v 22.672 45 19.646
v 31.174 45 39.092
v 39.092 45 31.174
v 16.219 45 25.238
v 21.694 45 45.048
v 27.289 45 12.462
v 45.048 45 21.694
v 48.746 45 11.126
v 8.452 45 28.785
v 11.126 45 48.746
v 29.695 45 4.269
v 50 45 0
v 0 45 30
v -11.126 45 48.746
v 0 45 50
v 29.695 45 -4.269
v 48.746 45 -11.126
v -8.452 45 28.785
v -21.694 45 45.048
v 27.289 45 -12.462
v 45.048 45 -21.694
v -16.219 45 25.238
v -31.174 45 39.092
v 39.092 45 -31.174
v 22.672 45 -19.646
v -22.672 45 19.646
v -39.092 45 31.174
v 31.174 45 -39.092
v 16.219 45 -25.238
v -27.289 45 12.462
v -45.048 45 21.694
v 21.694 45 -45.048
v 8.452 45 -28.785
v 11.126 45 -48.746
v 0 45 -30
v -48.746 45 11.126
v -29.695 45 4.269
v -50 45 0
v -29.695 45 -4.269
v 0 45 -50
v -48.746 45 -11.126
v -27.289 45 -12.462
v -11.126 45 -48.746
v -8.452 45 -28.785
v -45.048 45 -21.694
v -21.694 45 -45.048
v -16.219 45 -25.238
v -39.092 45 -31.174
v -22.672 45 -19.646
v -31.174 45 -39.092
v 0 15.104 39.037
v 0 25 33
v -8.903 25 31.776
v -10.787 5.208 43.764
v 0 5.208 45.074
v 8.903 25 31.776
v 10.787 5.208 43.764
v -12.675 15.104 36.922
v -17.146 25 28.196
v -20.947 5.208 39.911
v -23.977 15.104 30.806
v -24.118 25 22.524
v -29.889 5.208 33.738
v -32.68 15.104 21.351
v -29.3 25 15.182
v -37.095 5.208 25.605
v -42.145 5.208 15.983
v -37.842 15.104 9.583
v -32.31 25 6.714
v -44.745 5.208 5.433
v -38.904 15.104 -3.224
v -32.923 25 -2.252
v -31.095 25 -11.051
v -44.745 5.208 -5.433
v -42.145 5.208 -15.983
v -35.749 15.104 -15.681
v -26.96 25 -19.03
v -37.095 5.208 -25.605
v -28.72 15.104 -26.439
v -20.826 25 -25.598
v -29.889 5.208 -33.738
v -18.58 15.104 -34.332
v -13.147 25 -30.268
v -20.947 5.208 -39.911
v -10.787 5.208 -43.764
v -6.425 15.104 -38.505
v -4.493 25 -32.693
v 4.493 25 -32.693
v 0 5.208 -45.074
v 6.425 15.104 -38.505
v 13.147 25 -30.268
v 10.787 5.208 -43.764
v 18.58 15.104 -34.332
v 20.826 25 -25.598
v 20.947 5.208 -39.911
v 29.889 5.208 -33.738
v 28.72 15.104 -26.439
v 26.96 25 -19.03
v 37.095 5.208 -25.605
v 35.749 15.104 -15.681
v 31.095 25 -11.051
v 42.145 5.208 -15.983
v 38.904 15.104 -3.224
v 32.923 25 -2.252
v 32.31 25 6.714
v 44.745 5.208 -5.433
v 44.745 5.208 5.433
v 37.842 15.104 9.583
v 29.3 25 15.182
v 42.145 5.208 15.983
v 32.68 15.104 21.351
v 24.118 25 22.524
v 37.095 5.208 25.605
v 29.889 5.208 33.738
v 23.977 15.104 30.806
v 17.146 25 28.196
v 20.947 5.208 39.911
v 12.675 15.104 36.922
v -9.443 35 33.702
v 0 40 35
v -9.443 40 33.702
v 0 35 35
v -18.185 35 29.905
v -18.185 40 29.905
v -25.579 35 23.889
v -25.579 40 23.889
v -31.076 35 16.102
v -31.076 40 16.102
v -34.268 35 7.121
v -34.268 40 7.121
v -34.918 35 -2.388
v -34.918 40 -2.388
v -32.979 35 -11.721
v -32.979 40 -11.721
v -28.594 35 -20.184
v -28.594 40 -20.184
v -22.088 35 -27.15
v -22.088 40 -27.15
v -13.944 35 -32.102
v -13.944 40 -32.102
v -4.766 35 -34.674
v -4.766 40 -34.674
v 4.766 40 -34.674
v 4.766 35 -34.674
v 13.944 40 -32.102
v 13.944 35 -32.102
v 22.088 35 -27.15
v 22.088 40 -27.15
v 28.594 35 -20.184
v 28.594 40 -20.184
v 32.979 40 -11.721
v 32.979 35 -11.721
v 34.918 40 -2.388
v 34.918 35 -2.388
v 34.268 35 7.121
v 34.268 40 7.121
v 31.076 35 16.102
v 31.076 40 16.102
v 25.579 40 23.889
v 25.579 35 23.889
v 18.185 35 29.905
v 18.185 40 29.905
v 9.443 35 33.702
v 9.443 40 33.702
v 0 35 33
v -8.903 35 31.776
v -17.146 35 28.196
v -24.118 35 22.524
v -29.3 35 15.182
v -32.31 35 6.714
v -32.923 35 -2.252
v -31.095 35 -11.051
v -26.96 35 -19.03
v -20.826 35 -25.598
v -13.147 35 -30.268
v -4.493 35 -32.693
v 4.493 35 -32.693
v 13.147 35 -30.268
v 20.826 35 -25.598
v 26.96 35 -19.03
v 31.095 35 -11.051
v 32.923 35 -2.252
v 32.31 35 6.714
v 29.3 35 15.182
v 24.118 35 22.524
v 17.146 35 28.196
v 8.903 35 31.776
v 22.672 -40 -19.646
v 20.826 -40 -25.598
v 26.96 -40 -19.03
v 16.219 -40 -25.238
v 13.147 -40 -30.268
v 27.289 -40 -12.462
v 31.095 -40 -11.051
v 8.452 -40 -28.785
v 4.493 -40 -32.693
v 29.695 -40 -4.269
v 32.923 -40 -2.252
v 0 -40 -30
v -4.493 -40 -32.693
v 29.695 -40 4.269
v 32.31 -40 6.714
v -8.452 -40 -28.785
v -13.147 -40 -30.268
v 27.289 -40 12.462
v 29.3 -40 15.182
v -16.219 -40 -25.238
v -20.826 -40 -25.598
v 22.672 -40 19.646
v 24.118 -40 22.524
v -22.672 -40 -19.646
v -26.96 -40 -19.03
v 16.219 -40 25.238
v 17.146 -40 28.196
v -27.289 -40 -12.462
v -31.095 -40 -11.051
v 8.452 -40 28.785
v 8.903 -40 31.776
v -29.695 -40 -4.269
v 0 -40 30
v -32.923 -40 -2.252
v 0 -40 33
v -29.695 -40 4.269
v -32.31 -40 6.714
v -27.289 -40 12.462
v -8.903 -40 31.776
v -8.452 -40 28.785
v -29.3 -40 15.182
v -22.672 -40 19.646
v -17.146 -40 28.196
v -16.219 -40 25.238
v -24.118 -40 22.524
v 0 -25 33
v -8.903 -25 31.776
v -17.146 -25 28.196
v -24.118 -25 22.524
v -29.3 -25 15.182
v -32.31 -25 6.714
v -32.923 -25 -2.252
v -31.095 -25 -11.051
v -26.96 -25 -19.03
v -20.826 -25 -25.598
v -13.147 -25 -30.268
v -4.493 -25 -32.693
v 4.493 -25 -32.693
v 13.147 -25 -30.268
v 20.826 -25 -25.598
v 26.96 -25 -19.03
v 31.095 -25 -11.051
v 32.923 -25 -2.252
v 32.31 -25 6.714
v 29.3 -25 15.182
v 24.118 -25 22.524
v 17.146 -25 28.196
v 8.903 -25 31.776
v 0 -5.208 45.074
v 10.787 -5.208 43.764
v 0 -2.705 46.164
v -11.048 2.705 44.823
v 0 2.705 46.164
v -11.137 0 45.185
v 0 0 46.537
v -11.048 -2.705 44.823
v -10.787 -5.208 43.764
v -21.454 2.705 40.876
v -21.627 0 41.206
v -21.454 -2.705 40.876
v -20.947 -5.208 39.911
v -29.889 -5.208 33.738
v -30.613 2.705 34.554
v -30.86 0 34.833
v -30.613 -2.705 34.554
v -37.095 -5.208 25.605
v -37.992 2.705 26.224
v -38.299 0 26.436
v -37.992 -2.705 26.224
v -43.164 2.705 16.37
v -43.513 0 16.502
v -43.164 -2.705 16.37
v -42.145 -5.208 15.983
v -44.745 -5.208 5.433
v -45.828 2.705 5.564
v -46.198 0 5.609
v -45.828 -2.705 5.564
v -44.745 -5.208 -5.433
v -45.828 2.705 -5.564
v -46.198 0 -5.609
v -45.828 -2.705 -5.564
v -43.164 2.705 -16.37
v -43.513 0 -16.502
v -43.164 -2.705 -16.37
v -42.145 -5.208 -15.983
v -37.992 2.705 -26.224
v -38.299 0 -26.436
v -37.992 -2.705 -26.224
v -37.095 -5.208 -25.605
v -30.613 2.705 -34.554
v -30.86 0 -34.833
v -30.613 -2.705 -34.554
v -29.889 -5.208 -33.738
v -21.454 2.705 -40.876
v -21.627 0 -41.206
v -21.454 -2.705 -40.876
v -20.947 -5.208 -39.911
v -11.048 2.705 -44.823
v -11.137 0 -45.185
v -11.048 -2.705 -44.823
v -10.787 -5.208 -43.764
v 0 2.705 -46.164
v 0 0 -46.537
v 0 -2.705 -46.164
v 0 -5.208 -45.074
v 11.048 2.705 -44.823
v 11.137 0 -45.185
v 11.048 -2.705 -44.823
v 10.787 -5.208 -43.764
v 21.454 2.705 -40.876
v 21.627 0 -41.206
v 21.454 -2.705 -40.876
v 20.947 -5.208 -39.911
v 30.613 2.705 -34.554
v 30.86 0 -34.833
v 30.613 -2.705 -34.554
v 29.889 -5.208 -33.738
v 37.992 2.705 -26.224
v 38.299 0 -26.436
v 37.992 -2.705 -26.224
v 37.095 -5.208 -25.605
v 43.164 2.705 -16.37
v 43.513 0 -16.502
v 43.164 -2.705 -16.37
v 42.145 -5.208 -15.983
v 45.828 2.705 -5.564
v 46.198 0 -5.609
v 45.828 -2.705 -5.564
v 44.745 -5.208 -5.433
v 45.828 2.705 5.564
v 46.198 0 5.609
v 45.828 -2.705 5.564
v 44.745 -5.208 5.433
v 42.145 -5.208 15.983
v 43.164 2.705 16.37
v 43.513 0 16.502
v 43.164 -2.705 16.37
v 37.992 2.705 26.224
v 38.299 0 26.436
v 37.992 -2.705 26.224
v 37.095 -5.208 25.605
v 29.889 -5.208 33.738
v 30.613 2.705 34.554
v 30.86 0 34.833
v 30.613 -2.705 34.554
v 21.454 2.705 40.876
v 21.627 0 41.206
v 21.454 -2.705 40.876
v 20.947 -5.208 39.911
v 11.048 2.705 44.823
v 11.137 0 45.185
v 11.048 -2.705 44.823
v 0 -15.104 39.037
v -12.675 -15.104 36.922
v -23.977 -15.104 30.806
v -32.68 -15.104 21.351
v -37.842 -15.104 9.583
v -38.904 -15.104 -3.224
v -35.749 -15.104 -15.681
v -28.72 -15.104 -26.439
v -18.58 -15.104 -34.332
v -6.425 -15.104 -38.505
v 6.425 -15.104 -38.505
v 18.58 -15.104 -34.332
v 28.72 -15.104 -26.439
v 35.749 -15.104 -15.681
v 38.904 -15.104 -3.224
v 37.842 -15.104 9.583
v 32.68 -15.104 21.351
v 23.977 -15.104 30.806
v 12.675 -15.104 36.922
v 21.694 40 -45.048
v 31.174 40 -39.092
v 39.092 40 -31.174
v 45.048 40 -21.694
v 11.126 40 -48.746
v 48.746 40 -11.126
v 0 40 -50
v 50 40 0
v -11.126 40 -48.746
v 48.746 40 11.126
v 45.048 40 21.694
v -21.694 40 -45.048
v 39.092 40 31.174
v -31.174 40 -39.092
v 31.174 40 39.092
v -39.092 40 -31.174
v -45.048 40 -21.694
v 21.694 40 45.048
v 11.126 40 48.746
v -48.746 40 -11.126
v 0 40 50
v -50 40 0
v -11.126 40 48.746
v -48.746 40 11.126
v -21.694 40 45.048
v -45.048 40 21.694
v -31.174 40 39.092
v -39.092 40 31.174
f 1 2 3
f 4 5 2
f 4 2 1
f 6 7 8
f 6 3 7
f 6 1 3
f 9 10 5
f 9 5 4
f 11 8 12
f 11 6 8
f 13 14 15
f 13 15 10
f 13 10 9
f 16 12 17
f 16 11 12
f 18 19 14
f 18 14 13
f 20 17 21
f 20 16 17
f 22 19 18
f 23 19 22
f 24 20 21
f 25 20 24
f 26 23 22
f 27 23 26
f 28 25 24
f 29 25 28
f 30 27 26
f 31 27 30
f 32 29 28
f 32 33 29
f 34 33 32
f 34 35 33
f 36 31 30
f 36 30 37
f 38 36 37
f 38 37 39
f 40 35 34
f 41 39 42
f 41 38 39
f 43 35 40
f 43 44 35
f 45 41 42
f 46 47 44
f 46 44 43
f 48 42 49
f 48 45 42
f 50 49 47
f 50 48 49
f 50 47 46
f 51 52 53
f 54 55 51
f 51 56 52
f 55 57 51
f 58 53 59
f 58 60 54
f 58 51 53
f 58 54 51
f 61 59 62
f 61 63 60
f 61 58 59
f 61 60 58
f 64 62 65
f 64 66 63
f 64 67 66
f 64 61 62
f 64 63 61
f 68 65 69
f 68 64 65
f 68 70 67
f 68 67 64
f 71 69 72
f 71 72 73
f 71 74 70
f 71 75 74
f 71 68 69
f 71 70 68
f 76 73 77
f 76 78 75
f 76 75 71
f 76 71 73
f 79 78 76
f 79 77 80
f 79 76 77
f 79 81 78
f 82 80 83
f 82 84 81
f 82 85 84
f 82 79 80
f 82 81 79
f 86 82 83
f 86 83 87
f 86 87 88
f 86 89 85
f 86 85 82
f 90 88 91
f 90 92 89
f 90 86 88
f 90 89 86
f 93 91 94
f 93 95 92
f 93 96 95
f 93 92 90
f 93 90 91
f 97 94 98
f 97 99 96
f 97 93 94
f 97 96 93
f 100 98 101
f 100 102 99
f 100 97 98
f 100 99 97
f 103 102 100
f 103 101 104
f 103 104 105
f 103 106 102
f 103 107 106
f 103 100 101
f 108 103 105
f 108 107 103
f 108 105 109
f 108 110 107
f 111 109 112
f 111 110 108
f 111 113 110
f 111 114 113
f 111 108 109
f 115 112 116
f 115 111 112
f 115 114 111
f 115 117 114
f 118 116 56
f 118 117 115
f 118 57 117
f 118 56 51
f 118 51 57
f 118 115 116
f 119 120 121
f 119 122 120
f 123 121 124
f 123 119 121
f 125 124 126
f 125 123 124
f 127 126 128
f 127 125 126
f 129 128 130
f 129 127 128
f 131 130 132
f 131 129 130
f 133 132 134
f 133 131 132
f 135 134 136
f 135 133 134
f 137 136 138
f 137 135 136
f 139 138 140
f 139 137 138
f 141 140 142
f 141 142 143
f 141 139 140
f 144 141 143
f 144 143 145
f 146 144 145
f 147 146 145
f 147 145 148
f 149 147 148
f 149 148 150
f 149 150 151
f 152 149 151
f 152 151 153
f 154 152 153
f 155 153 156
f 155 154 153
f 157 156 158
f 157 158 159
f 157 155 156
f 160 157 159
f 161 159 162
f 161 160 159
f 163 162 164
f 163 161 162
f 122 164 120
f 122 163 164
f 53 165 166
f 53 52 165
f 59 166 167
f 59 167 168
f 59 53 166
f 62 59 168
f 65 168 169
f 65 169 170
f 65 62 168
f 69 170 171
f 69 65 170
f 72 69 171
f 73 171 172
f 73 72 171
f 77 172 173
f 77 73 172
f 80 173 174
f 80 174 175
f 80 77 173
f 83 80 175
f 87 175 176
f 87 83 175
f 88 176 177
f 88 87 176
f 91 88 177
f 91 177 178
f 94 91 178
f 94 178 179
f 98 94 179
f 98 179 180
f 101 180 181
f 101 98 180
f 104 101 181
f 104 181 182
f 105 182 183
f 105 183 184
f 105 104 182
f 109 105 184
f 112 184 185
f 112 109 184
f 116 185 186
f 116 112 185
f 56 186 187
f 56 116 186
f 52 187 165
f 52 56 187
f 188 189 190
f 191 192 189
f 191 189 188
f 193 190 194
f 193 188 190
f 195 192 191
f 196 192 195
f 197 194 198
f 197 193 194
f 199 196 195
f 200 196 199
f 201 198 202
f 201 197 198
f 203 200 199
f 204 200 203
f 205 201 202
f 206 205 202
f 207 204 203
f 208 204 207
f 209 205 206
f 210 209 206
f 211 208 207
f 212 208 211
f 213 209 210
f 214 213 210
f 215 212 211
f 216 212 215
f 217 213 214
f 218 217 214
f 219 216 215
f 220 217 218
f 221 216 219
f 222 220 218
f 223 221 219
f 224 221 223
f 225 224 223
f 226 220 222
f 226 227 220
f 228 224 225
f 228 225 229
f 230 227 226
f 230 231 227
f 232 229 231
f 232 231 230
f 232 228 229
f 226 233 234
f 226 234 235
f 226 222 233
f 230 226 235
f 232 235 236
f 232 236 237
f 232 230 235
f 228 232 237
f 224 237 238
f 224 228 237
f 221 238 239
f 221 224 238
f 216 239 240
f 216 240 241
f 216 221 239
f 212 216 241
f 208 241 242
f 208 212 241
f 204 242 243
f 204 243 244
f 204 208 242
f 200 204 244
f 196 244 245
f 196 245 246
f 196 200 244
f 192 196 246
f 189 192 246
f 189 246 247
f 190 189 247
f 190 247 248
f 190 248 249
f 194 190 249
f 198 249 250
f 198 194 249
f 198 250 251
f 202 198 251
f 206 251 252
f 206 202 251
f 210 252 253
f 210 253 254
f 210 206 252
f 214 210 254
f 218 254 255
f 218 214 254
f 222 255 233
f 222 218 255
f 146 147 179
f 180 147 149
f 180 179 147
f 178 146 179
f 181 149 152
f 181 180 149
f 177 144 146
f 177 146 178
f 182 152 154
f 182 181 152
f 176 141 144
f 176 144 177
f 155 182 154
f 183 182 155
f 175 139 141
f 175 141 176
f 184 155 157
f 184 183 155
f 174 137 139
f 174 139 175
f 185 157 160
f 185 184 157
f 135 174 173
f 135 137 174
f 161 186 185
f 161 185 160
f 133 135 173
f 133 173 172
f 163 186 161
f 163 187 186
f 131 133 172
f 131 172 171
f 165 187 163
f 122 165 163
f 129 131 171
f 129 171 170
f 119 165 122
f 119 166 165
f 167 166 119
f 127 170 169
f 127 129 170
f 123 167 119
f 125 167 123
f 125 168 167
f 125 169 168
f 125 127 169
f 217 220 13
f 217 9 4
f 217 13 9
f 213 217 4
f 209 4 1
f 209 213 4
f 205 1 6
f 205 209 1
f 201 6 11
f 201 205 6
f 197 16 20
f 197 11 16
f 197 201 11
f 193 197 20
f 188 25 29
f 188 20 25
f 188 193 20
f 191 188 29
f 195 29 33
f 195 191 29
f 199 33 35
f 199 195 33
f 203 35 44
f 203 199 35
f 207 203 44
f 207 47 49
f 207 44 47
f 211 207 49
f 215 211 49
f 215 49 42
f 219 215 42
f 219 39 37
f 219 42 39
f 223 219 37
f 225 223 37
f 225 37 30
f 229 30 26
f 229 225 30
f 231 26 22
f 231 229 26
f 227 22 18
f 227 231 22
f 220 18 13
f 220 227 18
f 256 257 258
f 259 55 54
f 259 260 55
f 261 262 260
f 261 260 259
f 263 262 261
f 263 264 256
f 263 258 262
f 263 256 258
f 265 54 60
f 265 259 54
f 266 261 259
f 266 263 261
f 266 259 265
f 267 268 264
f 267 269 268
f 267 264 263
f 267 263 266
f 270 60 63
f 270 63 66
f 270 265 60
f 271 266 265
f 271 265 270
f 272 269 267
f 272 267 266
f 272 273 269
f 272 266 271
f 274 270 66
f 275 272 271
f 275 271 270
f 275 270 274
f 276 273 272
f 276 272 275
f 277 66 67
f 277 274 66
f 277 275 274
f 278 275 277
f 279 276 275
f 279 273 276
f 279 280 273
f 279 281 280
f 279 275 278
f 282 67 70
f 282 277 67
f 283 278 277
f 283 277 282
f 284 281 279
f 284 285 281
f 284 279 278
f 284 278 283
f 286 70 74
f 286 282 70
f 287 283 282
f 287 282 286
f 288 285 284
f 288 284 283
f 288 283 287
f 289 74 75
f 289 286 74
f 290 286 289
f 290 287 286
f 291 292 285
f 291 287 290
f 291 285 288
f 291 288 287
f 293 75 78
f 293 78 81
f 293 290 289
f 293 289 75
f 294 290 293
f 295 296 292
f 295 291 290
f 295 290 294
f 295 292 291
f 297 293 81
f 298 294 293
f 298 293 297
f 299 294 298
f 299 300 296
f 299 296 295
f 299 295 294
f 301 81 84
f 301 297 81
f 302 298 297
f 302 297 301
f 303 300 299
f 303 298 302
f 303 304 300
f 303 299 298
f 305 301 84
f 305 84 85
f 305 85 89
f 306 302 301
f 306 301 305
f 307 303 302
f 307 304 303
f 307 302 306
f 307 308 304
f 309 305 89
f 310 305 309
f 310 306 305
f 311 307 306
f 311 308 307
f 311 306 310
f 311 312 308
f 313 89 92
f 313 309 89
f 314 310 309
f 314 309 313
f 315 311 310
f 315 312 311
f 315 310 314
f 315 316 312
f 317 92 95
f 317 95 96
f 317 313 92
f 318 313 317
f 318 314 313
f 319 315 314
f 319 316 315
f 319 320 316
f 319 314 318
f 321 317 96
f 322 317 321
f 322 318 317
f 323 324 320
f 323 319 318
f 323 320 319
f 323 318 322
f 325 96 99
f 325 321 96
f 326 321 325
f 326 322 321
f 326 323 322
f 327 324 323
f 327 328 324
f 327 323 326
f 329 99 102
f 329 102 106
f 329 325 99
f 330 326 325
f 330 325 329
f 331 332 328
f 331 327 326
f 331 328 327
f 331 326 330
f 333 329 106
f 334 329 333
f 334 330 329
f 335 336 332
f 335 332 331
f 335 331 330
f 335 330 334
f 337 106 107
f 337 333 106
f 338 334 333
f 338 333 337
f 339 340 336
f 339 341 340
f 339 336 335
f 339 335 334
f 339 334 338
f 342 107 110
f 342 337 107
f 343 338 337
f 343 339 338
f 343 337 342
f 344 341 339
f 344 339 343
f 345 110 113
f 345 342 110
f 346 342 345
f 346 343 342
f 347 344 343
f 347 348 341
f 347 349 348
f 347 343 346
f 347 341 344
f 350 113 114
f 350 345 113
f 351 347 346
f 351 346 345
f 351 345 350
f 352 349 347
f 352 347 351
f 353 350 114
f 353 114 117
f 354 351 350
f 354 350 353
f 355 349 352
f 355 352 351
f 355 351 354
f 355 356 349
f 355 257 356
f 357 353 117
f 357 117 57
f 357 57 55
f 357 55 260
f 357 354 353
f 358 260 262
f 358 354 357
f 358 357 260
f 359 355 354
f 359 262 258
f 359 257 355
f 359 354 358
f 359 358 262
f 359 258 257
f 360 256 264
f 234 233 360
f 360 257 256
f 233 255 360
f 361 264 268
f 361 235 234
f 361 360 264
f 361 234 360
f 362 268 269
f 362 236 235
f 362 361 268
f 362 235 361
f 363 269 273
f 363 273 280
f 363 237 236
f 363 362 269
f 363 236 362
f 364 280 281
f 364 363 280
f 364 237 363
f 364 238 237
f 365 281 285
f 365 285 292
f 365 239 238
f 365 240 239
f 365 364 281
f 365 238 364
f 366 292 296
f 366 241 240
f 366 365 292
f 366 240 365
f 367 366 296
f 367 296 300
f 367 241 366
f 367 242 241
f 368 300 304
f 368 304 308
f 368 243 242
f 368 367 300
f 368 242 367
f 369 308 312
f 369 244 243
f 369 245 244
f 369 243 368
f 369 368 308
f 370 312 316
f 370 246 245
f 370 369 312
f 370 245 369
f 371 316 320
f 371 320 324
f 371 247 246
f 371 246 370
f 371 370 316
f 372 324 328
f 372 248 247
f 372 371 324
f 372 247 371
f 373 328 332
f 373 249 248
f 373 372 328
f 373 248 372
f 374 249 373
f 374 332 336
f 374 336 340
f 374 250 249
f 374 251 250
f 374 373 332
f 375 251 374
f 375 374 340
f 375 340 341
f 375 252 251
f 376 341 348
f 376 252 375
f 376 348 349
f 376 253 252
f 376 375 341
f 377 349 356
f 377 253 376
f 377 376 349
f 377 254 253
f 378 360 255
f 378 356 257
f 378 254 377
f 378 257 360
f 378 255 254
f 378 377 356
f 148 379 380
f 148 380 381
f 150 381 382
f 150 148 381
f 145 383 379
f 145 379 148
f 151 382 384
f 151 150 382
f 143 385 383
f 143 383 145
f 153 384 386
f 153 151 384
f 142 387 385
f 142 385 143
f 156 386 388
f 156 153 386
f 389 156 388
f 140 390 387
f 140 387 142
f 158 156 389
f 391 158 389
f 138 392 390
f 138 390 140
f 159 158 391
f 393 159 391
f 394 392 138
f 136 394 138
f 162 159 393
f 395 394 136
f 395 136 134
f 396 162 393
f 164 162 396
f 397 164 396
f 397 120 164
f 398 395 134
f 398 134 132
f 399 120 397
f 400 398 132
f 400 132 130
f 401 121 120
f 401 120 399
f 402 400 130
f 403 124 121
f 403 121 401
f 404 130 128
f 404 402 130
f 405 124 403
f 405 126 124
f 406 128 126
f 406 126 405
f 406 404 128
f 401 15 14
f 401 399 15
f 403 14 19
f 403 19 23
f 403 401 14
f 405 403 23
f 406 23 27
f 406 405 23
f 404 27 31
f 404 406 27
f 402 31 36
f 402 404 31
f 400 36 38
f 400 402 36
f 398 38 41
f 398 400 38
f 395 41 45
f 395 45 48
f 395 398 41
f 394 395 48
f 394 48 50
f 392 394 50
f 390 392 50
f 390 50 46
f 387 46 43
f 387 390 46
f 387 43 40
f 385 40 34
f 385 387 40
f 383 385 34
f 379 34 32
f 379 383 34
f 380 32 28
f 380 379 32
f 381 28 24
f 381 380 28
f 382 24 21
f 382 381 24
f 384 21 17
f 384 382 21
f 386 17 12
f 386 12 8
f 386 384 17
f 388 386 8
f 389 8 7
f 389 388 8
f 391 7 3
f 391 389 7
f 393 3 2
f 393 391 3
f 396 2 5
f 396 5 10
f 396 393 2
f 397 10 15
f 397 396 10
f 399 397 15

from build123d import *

# Parameters (mm, degrees)
CUT_EXTRUDE1_DEPTH      = 84.815273071
CUT_EXTRUDE1_DEPTH_BACK = 84.815273071
SKETCH3_R               = 30


with BuildPart() as part:
    # Sketch1 → Revolve1 (revolve)
    with BuildSketch(Plane.XY, mode=Mode.PRIVATE) as revolve1_sk:
        with BuildLine():
            Line((0, 45), (-50, 45))
            Line((-50, 45), (-50, 40))
            Line((-50, 40), (-35, 40))
            Line((-35, 40), (-35, 35))
            Line((-35, 35), (-33, 35))
            Line((-33, 35), (-33, 25))
            Line((-33, 25), (-45.073826017, 5.207769821))
            ThreePointArc((-45.073826017, 5.207769821), (-46.536898379, 0), (-45.073826017, -5.207769821))
            Line((-45.073826017, -5.207769821), (-33, -25))
            Line((-33, -25), (-33, -40))
            Line((-33, -40), (0, -40))
            Line((0, -40), (0, 45))
        make_face()
    revolve(revolve1_sk.sketch.rotate(Axis((0, 78.93258427, 0), (0, -1, 0)), 270), axis=Axis((0, 78.93258427, 0), (0, -1, 0)))

    # Sketch3 → Cut-Extrude1 (cut, two sides: drawn at the far end of the back side and taken through both)
    with BuildSketch(Plane(origin=(0, 0, 0), x_dir=(1, 0, 0), z_dir=(0, 1, 0)).offset(-CUT_EXTRUDE1_DEPTH_BACK)):
        with Locations(Location((0, 0, 0), (0, 0, 270))):
            Circle(SKETCH3_R)
    extrude(amount=CUT_EXTRUDE1_DEPTH + CUT_EXTRUDE1_DEPTH_BACK, mode=Mode.SUBTRACT)


solid = part.part
